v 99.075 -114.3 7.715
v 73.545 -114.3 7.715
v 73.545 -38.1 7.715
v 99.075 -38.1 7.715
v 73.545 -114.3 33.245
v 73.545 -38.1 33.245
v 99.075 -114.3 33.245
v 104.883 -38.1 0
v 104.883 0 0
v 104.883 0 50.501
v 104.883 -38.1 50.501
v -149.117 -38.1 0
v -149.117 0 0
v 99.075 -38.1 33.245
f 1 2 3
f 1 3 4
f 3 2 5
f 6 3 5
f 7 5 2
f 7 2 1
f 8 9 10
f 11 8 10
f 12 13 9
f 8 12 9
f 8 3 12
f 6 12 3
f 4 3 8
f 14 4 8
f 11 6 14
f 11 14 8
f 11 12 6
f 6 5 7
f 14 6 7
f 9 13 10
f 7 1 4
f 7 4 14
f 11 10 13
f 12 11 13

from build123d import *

# Parameters (mm, degrees)
F0_W        = 254
F0_H        = 50.8
F1_DEPTH    = 38.1
F2_T1_DEPTH = 1365.7843192567
F3_W        = 25.5302116275
F3_H        = 25.5302092992
F4_DEPTH    = 76.2


# Not quite as in the source:
# - a fillet or chamfer that OpenCascade refuses, or shapes differently, is made with other operations: its cross-section is extruded or revolved along the edge and cut away or added


with BuildPart() as f1:
    # F0 (on Front) → F1 (new body)
    with BuildSketch(Plane.XZ):
        with Locations((-22.1173410591, 25.4)):
            Rectangle(F0_W, F0_H)
    extrude(amount=F1_DEPTH)

    # F2: chamfer of 50.8 x 255.5053741775 on 1 edges, made by hand

    # F2_s2 → F2_t1 (cut)
    with BuildSketch(Plane.XZ.offset(-663.8421596283)):
        Polygon((106.3880331184, 50.8), (-149.1173410591, 0), (-149.1173410591, 50.8), align=None)
    extrude(amount=F2_T1_DEPTH, mode=Mode.SUBTRACT)

    # F3 (on face) → F4 (join)
    with BuildSketch(Plane.XZ.offset(38.1)):
        with Locations((86.3100104034, 20.4800155479)):
            Rectangle(F3_W, F3_H)
    extrude(amount=F4_DEPTH)


solid = f1.part
